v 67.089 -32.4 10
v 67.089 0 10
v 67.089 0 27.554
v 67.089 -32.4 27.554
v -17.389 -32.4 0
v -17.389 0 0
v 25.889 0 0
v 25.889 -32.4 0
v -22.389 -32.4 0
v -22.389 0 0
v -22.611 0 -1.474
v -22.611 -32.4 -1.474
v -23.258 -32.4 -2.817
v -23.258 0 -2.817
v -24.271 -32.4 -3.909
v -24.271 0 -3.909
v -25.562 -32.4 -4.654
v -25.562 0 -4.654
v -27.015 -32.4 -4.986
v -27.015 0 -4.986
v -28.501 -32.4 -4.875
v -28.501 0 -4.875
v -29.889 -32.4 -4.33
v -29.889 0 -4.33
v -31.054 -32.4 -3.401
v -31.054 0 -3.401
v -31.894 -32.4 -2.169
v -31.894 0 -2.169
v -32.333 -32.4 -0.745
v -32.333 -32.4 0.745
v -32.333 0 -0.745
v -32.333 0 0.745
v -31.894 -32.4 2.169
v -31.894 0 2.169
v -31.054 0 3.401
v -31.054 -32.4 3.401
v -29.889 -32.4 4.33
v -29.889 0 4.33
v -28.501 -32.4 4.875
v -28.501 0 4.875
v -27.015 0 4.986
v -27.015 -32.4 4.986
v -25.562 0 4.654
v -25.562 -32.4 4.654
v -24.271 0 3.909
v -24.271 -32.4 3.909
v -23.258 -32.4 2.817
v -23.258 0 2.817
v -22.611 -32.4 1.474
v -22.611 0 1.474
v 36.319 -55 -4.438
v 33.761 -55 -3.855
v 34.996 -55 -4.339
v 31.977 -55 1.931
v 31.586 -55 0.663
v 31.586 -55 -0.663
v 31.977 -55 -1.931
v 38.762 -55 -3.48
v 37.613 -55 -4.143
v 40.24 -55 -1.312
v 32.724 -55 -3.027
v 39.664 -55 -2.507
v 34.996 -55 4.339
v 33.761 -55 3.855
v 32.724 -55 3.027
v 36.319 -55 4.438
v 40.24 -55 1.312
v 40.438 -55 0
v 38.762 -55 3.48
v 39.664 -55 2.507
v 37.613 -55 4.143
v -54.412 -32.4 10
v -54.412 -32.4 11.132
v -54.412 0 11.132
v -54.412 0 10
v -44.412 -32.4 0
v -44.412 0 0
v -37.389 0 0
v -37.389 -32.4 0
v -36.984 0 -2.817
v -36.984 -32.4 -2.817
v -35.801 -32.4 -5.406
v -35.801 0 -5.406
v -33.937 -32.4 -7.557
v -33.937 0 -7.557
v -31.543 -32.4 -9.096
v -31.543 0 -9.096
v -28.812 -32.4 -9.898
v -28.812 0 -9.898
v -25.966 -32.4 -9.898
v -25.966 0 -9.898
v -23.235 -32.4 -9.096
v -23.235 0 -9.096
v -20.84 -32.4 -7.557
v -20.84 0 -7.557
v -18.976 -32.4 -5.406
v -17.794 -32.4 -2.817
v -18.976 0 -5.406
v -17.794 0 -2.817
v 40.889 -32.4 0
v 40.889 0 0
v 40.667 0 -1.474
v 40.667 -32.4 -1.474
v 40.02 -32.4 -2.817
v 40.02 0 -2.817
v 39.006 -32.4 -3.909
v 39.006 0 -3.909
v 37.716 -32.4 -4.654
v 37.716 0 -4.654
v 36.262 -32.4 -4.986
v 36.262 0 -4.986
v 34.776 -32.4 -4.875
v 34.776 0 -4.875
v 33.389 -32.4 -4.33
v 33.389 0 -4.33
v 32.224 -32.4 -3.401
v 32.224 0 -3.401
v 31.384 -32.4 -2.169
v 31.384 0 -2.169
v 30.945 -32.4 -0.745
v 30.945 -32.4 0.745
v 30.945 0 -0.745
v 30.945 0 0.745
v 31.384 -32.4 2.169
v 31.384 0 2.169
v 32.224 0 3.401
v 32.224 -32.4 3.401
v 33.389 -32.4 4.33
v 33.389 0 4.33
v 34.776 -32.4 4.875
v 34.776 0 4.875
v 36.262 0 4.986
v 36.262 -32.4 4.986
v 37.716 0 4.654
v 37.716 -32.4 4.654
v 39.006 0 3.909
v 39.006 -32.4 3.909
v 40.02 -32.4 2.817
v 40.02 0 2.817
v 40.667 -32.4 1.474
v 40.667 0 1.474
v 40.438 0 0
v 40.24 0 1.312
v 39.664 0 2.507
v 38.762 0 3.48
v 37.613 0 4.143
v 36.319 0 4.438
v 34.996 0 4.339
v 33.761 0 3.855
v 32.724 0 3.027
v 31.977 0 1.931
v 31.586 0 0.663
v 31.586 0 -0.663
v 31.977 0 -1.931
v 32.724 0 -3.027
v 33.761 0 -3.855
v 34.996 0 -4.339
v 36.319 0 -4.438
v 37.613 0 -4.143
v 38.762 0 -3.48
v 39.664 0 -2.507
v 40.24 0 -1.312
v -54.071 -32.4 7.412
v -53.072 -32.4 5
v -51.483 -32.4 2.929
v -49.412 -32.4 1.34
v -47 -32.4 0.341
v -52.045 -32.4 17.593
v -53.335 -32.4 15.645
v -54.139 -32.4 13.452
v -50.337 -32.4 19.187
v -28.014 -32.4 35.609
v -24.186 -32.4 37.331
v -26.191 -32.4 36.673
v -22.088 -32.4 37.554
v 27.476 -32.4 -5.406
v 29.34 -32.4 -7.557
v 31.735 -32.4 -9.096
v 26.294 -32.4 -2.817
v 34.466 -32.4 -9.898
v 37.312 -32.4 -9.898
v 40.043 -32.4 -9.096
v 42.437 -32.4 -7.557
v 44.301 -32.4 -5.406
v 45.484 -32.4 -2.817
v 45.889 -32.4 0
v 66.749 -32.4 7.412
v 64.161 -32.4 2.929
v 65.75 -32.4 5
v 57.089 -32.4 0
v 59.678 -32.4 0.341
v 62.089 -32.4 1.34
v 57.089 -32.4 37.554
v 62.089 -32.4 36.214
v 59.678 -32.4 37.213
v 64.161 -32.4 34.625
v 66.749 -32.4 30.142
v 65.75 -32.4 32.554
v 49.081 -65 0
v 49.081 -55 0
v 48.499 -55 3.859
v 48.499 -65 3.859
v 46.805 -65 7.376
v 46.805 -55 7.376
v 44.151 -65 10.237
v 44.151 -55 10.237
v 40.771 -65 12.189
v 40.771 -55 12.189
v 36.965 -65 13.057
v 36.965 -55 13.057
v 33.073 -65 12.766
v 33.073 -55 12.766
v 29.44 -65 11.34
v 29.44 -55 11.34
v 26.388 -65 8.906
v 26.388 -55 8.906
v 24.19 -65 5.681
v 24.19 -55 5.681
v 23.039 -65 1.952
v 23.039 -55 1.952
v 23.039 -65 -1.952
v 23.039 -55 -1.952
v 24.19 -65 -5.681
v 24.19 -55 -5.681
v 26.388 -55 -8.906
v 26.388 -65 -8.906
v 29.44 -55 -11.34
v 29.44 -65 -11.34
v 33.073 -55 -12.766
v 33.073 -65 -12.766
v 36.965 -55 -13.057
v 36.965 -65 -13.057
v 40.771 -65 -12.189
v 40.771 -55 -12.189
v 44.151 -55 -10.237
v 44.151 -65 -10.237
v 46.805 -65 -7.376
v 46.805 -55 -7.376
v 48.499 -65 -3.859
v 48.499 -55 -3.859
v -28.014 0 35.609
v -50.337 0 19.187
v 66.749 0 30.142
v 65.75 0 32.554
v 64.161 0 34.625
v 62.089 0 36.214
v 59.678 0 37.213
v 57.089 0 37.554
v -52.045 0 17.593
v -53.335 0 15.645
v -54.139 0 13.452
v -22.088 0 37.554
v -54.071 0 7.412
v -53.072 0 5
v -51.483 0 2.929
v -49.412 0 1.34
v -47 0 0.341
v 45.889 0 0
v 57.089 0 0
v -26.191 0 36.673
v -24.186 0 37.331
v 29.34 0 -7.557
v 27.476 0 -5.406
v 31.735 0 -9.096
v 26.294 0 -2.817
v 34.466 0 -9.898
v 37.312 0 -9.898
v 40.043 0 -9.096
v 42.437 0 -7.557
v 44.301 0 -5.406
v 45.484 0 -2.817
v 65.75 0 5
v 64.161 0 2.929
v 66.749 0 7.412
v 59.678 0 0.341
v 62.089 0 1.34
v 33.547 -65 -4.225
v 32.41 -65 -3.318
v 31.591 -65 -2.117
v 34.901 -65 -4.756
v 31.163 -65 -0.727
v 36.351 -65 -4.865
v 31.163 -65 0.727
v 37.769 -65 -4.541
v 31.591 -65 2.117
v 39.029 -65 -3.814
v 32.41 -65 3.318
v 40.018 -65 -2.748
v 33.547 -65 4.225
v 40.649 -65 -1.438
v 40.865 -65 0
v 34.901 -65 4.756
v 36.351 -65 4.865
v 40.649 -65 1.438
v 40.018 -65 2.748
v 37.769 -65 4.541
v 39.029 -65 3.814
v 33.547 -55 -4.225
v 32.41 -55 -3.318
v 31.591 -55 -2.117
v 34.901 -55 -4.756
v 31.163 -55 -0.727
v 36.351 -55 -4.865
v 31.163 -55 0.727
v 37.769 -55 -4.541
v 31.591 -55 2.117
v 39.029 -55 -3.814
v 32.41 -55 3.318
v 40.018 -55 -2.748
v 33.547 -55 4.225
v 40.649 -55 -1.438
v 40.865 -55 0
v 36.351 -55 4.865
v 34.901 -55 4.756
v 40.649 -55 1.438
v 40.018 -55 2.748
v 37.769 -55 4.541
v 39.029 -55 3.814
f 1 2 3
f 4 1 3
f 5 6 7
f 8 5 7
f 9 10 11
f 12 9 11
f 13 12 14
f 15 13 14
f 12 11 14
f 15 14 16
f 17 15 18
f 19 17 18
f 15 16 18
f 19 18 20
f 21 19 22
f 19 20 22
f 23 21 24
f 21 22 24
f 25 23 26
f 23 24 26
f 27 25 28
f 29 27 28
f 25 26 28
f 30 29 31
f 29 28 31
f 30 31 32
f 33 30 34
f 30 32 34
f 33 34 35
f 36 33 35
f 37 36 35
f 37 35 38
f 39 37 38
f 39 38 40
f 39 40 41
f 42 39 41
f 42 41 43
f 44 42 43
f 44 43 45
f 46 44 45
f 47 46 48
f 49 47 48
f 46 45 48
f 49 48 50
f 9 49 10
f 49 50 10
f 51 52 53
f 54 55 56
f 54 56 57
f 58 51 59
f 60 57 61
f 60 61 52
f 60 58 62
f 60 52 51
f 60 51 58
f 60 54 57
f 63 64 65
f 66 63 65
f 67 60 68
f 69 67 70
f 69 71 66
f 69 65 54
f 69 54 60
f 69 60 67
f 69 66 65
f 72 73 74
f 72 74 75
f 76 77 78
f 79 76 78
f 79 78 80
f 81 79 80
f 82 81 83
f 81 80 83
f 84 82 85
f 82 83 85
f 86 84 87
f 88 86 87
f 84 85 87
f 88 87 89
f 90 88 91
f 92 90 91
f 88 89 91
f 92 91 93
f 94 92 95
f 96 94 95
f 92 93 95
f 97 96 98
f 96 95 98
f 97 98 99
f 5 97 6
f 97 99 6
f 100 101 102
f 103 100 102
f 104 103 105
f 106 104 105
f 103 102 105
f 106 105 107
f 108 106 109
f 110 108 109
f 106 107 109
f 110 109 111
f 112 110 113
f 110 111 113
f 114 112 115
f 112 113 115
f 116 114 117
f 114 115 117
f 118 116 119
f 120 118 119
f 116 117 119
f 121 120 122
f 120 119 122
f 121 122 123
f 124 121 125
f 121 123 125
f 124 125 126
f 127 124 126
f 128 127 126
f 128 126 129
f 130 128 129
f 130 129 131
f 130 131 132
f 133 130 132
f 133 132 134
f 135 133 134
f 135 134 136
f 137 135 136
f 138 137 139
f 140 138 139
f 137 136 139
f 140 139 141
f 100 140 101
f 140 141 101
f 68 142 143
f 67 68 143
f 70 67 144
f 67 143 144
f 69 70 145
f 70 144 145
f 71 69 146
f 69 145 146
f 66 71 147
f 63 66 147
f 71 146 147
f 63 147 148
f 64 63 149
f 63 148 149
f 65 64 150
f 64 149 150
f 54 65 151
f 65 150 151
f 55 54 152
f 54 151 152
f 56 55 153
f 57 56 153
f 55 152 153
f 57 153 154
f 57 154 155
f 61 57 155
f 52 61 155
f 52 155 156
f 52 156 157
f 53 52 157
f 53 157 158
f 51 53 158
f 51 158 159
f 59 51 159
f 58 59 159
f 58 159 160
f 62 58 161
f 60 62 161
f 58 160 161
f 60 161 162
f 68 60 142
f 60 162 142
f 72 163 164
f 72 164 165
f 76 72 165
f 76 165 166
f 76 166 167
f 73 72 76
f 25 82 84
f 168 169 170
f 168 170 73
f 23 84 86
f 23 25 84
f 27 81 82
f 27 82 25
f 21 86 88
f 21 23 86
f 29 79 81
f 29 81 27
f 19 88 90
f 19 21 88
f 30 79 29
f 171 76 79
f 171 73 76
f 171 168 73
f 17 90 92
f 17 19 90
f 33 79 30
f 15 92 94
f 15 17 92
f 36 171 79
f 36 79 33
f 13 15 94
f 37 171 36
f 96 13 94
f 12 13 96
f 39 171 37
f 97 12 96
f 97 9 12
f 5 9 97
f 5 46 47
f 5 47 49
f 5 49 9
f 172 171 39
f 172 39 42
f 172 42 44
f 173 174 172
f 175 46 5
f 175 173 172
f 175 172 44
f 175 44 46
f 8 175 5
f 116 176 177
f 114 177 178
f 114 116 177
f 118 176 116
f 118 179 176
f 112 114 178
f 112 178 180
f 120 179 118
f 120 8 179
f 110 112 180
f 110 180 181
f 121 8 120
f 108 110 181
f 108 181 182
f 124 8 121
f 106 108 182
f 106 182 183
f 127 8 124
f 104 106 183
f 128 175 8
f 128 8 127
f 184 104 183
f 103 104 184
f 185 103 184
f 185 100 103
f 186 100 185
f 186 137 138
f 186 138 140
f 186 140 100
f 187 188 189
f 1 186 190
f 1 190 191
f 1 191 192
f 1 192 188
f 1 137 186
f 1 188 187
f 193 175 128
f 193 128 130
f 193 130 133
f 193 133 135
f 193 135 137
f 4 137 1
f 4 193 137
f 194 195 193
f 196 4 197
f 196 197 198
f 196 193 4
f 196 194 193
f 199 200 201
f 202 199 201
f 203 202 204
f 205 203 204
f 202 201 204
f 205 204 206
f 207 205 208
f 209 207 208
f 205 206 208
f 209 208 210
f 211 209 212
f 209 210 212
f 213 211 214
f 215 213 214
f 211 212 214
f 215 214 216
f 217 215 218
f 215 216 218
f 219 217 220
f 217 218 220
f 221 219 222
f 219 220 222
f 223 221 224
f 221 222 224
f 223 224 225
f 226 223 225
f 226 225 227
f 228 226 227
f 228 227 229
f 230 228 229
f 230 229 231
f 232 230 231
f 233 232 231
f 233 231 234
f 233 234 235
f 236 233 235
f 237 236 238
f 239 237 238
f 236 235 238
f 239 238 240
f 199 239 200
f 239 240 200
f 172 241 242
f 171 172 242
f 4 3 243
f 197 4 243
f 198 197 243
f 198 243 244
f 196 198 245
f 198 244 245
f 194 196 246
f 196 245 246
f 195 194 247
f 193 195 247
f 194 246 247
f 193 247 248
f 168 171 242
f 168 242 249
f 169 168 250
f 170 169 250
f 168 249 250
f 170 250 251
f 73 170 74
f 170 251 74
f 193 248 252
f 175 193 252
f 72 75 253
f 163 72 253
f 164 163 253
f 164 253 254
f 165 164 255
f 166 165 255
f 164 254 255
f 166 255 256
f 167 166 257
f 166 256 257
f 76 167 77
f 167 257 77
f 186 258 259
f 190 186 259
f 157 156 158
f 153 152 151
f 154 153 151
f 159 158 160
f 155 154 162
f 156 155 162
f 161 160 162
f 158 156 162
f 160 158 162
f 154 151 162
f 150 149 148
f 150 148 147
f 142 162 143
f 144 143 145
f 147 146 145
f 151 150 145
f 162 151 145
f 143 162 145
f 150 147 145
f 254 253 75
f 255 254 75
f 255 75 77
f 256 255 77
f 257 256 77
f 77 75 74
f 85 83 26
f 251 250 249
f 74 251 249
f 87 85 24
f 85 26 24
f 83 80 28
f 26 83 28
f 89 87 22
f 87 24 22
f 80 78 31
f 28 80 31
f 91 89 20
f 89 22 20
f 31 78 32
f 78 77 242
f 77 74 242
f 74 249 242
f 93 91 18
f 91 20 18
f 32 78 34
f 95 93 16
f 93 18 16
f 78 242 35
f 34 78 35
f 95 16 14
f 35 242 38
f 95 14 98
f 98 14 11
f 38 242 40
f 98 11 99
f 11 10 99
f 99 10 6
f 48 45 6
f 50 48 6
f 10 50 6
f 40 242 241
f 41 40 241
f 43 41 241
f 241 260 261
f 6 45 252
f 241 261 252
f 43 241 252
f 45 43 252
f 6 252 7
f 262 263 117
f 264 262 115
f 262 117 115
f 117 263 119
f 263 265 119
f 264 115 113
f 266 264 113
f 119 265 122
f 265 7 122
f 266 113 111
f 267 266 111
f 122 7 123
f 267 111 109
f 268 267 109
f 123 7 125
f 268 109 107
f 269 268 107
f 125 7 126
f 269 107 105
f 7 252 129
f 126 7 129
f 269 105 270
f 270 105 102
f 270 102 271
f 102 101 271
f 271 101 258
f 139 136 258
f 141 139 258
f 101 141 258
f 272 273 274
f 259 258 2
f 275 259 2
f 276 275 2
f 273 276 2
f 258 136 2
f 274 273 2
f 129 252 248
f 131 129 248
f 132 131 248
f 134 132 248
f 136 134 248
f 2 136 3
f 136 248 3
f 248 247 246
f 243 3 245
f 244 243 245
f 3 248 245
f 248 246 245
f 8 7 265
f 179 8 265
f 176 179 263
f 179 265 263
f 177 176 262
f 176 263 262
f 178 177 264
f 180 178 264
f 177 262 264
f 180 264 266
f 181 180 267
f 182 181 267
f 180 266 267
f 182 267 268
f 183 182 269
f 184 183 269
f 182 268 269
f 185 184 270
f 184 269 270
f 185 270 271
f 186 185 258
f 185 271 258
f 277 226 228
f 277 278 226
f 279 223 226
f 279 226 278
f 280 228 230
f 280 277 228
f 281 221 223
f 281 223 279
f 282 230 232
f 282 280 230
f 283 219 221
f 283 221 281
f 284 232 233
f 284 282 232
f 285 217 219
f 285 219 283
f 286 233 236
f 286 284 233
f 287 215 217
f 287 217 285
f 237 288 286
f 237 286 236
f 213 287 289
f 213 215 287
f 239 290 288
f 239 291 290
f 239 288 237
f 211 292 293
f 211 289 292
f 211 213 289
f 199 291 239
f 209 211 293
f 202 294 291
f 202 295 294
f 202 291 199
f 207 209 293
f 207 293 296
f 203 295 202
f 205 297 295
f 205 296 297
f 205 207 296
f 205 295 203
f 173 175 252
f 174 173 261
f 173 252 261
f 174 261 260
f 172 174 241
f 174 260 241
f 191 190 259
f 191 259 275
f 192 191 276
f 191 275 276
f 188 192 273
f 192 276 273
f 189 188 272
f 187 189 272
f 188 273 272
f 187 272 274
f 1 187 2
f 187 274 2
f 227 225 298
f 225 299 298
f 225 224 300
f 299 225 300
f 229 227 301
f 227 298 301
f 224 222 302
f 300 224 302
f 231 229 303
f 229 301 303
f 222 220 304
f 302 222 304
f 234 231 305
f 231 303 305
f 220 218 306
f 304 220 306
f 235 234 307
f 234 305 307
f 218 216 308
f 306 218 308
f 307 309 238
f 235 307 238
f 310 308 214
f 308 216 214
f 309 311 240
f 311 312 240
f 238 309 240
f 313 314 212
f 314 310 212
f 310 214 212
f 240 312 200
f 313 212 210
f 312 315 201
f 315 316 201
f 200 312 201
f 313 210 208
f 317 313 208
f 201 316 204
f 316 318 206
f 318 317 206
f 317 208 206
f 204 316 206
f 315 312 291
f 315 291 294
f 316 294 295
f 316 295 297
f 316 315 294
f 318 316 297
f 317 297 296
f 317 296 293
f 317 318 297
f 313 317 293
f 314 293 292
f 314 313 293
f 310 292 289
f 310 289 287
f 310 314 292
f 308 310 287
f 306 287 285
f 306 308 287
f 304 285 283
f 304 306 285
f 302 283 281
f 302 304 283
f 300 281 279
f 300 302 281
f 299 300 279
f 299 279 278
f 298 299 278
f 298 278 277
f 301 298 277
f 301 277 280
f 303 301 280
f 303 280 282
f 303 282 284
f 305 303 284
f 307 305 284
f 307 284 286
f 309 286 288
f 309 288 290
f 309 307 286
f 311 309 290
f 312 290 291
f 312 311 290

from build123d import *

# Parameters (mm, degrees)
F1_DEPTH = 32.4
F2_R     = 4.4508711147
F3_DEPTH = 55
F4_R     = 13.0938793488
F4_R_2   = 4.8786772114
F5_DEPTH = 10


with BuildPart() as f1:
    # F0 (on Front) → F1 (new body)
    with BuildSketch(Plane.XZ):
        with BuildLine():
            Line((-54.4117640608, 11.1319997395), (-54.4117640608, 10))
            ThreePointArc((-54.4117640608, 10), (-51.4828318727, 2.9289321881), (-44.4117640608, 0))
            Line((-44.4117640608, 0), (-37.3888360451, 0))
            ThreePointArc((-37.3888360451, 0), (-27.3888360451, 10), (-17.3888360451, 0))
            Line((-17.3888360451, 0), (25.8888206446, 0))
            ThreePointArc((25.8888206446, 0), (35.8888206446, 10), (45.8888206446, 0))
            Line((45.8888206446, 0), (57.0894953274, 0))
            ThreePointArc((57.0894953274, 0), (64.1605631392, 2.9289321881), (67.0894953274, 10))
            Line((67.0894953274, 10), (67.0894953274, 27.5541305458))
            ThreePointArc((67.0894953274, 27.5541305458), (64.1605631392, 34.6251983576), (57.0894953274, 37.5541305458))
            Line((57.0894953274, 37.5541305458), (-22.0879299198, 37.5541305458))
            ThreePointArc((-22.0879299198, 37.5541305458), (-25.2062545738, 37.0555015706), (-28.0136018226, 35.6093408162))
            Line((-28.0136018226, 35.6093408162), (-50.3374359636, 19.1872100099))
            ThreePointArc((-50.3374359636, 19.1872100099), (-53.3352364519, 15.6454951129), (-54.4117640608, 11.1319997395))
        make_face()
        with BuildLine():
            ThreePointArc((-17.3888360451, 0), (-27.3888360451, 10), (-37.3888360451, 0))
            Line((-37.3888360451, 0), (-32.3888360451, 0))
            ThreePointArc((-32.3888360451, 0), (-27.3888360451, 5), (-22.3888360451, 0))
            Line((-22.3888360451, 0), (-17.3888360451, 0))
        make_face()
        with BuildLine():
            Line((-32.3888360451, 0), (-37.3888360451, 0))
            ThreePointArc((-37.3888360451, 0), (-27.3888360451, -10), (-17.3888360451, 0))
            Line((-17.3888360451, 0), (-22.3888360451, 0))
            ThreePointArc((-22.3888360451, 0), (-27.3888360451, -5), (-32.3888360451, 0))
        make_face()
        with BuildLine():
            ThreePointArc((45.8888206446, 0), (35.8888206446, 10), (25.8888206446, 0))
            Line((25.8888206446, 0), (30.8888206446, 0))
            ThreePointArc((30.8888206446, 0), (35.8888206446, 5), (40.8888206446, 0))
            Line((40.8888206446, 0), (45.8888206446, 0))
        make_face()
        with BuildLine():
            Line((30.8888206446, 0), (25.8888206446, 0))
            ThreePointArc((25.8888206446, 0), (35.8888206446, -10), (45.8888206446, 0))
            Line((45.8888206446, 0), (40.8888206446, 0))
            ThreePointArc((40.8888206446, 0), (35.8888206446, -5), (30.8888206446, 0))
        make_face()
    extrude(amount=F1_DEPTH)


with BuildPart() as f3:
    # F2 (on Front) → F3 (new body)
    with BuildSketch(Plane.XZ):
        with Locations((35.986777395, 0)):
            Circle(F2_R)
    extrude(amount=F3_DEPTH)


with BuildPart() as f5:
    # F4 (on face) → F5 (new body)
    with BuildSketch(Plane.XZ.offset(55)):
        with Locations((35.986777395, 0)):
            Circle(F4_R)
        with Locations((35.986777395, 0)):
            Circle(F4_R_2, mode=Mode.SUBTRACT)
    extrude(amount=F5_DEPTH)


solid = Compound([f1.part, f3.part, f5.part])
